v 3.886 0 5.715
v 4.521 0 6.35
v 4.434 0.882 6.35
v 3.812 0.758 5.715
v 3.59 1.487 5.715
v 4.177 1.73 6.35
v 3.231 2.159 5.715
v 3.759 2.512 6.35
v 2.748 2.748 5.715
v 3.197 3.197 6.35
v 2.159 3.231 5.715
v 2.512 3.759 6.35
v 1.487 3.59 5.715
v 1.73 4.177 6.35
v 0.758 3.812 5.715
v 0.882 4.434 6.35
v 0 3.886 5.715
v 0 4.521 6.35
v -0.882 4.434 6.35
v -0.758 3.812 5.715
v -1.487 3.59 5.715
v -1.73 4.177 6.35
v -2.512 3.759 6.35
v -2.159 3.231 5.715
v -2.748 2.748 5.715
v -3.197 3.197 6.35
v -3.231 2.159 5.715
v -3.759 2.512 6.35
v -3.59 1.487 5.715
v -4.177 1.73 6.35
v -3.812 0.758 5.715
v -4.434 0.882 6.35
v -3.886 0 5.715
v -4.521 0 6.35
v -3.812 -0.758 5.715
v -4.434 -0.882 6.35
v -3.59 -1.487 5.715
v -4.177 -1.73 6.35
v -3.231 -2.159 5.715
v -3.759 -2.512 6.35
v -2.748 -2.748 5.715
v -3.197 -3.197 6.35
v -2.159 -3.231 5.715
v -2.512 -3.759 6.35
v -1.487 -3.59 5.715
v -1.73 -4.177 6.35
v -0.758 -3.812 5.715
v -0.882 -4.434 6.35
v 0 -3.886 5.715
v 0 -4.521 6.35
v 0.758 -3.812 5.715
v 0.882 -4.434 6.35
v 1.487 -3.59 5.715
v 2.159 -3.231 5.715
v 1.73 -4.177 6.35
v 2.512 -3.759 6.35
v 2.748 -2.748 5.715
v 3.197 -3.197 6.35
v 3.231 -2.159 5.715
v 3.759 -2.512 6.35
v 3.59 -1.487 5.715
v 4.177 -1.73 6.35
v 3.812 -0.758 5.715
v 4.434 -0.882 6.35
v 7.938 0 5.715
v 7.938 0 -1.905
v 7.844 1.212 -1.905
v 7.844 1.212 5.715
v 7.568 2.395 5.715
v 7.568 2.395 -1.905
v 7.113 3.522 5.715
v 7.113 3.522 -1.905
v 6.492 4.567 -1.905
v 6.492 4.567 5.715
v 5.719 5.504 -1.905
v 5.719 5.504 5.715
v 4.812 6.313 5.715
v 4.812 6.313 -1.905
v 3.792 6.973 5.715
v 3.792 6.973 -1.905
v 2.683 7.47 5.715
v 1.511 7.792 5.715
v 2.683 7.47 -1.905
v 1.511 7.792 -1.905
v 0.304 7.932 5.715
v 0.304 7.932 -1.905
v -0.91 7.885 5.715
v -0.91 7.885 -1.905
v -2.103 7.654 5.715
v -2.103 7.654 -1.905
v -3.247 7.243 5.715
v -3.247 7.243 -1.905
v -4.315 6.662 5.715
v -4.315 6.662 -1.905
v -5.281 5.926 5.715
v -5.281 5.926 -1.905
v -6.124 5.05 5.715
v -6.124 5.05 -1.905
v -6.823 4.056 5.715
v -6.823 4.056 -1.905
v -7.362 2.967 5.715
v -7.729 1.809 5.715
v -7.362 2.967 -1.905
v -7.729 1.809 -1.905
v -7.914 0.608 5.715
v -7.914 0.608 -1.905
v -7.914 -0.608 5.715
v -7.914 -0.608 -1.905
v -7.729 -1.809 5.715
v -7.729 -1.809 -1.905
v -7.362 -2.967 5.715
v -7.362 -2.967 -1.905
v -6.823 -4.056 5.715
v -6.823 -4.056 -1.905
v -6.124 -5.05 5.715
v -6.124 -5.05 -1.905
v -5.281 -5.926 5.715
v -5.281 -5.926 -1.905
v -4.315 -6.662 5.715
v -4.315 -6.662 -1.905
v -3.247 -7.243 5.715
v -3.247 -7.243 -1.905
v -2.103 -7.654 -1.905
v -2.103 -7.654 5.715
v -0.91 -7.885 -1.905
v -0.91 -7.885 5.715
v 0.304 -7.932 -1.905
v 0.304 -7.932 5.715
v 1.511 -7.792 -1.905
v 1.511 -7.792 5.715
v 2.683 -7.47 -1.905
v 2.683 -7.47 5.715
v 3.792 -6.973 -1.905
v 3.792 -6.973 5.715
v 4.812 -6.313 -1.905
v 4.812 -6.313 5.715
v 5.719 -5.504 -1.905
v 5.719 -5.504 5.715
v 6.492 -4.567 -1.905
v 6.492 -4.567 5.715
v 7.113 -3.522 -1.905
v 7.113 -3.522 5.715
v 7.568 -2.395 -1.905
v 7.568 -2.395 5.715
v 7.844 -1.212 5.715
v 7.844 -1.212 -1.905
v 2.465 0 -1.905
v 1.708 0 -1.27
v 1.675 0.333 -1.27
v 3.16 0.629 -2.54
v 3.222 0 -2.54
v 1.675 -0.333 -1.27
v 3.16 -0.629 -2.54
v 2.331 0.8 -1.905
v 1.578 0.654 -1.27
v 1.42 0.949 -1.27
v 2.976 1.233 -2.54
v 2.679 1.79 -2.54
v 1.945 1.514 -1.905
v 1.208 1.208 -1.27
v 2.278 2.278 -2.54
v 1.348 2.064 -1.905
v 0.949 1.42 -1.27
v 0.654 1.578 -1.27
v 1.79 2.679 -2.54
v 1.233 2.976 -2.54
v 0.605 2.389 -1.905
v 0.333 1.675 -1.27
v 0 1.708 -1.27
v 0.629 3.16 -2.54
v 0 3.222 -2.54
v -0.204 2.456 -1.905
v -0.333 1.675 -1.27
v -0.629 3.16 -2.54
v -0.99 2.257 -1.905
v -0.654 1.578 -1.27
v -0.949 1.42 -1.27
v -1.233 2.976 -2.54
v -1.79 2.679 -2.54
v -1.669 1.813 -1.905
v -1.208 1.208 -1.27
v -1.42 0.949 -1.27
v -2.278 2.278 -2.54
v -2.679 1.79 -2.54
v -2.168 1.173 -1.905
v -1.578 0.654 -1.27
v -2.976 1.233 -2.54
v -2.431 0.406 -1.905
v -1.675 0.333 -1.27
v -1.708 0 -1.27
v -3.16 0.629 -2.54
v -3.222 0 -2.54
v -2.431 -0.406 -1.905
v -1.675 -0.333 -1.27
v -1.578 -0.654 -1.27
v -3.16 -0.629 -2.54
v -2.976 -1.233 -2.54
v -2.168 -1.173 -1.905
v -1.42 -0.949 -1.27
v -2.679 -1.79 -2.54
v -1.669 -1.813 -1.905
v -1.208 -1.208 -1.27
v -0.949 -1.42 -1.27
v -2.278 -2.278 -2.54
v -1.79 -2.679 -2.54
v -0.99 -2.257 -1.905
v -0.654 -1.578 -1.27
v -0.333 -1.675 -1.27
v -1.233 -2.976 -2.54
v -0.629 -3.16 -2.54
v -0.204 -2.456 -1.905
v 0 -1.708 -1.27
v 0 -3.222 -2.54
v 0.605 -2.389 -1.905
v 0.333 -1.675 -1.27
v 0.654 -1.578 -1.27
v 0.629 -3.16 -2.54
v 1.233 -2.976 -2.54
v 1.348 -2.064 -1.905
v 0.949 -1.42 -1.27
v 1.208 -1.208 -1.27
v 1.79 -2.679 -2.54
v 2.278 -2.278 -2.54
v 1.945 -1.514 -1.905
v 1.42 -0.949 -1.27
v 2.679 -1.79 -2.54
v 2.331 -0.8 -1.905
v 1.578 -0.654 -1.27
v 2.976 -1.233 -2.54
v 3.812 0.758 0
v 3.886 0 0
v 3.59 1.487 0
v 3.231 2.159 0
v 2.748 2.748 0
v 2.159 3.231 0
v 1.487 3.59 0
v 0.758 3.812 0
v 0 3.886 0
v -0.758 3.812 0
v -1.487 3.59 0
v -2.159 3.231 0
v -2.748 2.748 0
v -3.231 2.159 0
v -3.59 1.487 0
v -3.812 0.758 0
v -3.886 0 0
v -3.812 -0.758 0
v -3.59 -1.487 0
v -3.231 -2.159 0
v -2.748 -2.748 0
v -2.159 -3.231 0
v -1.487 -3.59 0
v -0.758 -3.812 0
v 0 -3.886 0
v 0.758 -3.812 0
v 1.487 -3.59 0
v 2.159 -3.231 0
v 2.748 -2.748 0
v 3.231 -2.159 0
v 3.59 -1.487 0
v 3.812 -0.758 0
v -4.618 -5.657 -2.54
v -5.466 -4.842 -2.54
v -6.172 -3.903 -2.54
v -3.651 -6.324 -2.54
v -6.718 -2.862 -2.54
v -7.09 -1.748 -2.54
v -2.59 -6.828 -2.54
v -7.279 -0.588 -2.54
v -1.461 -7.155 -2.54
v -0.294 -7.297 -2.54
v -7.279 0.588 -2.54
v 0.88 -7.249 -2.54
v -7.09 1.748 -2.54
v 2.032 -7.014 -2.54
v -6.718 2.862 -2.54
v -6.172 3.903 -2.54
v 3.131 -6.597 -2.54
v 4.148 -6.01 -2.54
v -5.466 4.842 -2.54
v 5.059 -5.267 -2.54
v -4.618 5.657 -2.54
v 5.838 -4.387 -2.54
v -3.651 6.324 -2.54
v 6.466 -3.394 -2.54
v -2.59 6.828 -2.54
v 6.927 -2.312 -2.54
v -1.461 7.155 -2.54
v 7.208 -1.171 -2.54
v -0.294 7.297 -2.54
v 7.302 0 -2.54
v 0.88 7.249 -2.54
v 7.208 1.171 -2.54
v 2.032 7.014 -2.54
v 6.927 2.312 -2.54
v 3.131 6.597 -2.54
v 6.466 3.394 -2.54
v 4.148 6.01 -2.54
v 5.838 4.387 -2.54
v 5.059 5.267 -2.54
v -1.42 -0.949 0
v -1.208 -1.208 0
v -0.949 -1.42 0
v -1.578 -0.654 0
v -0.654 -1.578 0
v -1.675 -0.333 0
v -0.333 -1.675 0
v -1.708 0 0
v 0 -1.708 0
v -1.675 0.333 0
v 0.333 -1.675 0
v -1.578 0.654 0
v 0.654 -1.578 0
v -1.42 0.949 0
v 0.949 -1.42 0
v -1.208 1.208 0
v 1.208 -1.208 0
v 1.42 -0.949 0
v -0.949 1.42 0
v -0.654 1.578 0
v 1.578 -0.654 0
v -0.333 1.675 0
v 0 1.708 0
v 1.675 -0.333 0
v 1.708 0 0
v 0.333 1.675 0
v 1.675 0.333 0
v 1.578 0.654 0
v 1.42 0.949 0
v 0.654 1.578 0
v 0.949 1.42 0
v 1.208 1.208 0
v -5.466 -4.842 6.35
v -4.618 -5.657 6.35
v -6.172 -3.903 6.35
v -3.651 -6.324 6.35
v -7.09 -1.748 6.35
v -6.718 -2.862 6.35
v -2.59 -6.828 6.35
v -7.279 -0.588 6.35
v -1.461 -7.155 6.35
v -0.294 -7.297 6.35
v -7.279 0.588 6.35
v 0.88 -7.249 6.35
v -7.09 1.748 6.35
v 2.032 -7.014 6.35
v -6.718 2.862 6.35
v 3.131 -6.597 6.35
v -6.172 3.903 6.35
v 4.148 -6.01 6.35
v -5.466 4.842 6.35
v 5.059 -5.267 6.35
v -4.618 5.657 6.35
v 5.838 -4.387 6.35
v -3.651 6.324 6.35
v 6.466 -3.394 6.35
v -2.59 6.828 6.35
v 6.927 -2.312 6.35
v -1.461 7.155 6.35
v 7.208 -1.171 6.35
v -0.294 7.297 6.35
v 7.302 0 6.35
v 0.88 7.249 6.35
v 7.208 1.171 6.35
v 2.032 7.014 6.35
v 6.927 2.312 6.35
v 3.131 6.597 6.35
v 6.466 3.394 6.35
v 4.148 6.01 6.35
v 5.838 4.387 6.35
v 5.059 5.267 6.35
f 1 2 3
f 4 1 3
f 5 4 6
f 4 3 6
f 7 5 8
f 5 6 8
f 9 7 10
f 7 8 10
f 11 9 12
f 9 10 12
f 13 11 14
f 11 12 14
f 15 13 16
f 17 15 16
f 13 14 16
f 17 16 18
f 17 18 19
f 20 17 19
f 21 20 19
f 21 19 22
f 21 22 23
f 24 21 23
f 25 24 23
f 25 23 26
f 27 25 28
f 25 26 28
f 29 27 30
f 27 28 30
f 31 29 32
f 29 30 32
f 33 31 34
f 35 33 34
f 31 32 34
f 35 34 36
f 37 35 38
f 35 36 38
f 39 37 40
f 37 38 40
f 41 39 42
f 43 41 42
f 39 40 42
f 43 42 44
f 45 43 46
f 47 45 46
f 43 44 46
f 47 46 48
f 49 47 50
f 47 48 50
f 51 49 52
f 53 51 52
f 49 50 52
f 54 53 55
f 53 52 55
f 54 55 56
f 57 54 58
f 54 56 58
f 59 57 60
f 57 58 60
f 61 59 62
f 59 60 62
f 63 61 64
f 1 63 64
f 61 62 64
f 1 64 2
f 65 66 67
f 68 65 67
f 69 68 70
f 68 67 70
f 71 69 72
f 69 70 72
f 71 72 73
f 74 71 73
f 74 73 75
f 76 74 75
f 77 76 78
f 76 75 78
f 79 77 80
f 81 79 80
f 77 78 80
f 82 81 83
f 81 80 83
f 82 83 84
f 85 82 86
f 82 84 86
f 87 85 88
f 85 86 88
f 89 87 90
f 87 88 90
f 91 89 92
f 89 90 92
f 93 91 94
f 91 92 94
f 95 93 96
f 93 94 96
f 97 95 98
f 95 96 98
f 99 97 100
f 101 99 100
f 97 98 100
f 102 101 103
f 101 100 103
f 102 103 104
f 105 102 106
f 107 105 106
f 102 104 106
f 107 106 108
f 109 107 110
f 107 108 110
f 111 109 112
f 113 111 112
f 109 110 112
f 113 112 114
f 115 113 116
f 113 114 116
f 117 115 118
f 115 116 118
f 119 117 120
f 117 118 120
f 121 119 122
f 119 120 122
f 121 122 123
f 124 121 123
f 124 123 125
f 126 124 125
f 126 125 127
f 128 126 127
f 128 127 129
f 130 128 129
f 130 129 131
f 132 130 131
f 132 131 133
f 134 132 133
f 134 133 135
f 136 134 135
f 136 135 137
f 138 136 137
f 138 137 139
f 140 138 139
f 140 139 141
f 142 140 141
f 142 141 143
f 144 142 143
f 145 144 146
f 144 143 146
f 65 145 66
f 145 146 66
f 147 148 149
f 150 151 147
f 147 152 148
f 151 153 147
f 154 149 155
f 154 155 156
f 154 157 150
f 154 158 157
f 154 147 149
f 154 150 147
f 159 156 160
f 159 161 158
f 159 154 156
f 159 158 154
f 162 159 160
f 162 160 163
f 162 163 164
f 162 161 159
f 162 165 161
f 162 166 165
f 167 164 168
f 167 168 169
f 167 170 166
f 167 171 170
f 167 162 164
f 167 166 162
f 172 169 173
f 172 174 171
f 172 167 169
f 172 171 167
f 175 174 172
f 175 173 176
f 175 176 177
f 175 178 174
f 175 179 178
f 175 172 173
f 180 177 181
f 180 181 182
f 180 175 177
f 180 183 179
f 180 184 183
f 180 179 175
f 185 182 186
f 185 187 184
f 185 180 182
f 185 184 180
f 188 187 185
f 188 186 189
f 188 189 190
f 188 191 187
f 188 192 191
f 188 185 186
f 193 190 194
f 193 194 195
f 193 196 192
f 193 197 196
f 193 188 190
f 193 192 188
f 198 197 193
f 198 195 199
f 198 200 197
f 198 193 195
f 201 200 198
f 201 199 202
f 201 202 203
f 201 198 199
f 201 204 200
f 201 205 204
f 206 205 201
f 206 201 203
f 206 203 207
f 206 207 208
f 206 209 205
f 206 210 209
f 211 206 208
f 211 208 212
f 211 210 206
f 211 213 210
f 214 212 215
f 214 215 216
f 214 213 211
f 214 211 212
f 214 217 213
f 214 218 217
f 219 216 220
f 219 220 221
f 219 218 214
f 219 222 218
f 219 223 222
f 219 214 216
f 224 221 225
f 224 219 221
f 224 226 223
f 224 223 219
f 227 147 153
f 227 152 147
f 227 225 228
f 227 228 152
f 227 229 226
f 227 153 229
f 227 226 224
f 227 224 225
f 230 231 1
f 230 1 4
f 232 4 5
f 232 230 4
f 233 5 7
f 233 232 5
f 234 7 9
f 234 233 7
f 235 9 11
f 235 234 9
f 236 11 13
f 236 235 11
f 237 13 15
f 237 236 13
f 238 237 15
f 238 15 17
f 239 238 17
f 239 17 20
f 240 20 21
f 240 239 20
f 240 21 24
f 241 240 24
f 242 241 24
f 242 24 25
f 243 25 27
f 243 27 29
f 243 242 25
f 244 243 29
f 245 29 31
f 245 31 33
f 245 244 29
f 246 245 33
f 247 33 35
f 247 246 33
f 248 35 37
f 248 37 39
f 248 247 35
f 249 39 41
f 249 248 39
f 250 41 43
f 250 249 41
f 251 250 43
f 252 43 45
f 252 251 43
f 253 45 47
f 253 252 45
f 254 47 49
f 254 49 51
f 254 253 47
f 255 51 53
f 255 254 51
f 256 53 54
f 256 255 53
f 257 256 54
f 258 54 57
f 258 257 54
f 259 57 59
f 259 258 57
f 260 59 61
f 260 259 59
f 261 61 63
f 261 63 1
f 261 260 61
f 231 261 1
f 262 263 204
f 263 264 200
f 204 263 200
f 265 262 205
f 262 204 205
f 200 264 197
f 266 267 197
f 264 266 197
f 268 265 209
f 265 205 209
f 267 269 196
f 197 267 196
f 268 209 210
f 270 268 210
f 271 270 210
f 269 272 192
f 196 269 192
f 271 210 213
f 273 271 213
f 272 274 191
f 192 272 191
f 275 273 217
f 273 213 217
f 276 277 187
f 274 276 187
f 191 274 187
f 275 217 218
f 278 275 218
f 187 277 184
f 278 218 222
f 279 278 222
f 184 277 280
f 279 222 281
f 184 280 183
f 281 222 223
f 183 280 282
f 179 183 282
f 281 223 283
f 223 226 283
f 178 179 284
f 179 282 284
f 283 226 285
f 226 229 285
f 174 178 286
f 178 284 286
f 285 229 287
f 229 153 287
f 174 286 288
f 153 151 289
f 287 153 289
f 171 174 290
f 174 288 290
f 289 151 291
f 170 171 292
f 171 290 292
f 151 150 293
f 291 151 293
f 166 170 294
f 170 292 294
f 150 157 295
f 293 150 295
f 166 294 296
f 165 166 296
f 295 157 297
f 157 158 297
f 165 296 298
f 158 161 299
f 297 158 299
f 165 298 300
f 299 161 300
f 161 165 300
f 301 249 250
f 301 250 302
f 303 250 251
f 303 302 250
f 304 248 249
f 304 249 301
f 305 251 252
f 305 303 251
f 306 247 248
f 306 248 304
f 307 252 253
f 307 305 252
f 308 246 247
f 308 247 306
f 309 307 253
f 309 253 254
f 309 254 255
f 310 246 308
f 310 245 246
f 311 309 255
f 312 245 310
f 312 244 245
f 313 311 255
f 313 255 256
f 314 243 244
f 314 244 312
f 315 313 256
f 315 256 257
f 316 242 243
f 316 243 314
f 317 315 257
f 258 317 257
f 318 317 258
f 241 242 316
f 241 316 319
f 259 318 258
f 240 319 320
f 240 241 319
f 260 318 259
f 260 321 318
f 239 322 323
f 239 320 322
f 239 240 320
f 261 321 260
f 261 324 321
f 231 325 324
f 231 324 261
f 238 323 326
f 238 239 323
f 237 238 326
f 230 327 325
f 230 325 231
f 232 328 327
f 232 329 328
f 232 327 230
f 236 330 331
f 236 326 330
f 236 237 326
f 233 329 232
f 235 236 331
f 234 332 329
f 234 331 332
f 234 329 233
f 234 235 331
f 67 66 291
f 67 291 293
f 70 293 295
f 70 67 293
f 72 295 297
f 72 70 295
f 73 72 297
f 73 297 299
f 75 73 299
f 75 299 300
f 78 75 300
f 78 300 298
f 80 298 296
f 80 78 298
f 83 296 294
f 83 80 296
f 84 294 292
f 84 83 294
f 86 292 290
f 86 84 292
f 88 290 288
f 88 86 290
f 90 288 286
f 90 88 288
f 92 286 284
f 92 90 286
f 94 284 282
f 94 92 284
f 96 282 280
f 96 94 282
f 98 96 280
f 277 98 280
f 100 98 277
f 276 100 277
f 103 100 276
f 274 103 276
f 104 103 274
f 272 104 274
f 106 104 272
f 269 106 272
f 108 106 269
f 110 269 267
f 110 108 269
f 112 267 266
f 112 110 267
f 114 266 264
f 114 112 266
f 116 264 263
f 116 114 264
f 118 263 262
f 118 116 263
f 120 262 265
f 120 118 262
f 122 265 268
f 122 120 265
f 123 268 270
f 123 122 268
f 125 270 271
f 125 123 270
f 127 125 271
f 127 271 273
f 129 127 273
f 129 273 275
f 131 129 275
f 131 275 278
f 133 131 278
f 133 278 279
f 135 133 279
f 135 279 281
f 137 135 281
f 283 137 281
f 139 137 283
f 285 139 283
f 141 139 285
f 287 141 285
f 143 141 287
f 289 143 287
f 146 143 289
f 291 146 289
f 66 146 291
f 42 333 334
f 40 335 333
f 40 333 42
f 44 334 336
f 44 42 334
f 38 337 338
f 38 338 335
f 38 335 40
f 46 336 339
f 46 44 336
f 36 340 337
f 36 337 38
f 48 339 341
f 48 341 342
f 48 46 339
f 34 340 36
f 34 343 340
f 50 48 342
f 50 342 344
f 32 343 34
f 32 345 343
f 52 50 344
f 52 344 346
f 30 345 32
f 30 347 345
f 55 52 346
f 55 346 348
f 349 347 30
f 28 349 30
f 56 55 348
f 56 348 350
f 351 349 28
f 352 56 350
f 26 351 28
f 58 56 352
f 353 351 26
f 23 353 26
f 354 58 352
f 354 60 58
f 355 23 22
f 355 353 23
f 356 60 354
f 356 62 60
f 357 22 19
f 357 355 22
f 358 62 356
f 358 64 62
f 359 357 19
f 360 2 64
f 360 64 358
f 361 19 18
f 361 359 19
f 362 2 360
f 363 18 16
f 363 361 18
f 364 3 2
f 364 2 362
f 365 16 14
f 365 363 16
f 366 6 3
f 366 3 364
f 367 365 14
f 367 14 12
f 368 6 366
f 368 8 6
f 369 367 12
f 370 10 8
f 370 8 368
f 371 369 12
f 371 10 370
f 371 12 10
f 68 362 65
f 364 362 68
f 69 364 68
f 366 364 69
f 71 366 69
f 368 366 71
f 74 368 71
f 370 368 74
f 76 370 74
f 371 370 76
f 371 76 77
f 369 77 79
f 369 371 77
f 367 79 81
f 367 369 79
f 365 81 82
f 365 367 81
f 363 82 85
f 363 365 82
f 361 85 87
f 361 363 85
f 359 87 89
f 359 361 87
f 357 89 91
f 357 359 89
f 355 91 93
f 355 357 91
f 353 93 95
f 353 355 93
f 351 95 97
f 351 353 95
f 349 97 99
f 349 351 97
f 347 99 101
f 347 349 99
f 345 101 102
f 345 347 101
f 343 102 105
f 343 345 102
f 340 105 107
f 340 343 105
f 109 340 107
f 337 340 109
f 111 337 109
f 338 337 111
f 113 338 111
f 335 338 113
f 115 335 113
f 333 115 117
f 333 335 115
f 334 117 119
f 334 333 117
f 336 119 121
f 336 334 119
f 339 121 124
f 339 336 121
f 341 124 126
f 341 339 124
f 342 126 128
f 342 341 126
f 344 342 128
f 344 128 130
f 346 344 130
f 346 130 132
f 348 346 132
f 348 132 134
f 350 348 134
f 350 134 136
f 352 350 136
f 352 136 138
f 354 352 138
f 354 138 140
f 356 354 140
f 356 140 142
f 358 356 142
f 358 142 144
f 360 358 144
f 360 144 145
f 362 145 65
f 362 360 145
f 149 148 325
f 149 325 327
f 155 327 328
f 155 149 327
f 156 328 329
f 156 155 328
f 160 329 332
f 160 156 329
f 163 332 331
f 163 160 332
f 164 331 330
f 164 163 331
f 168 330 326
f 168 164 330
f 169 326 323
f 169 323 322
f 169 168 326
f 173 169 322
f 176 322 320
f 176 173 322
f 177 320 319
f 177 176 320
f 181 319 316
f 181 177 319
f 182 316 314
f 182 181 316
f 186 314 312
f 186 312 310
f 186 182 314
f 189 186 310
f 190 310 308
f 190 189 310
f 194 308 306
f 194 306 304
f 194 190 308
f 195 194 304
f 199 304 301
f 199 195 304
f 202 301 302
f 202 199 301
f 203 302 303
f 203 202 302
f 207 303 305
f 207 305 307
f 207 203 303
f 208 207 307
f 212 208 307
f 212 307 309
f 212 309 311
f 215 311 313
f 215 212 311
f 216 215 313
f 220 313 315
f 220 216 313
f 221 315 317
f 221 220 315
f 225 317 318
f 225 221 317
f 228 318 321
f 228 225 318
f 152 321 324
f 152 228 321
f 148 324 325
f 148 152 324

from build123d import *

# Parameters (mm, degrees)
SKETCH2_R             = 7.9375
SKETCH2_R_2           = 3.8862
BOSS_EXTRUDE1_DEPTH   = 6.35
SKETCH2_R_3           = 1.70815
BOSS_EXTRUDE1_2_DEPTH = 6.35
BOSS_EXTRUDE3_START   = -2.54
SKETCH2_6_R           = 7.9375
SKETCH2_6_R_2         = 1.70815
BOSS_EXTRUDE3_DEPTH   = 2.54
CHAMFER2_SIZE         = 1.27
CHAMFER2_SIZE2        = 1.513527063
CHAMFER3_SIZE         = 0.635


with BuildPart() as part:
    # Sketch2 → Boss-Extrude1 (new body)
    with BuildSketch(Plane(origin=(0, 0, 0), x_dir=(0, 1, 0), z_dir=(0, 0, 1))):
        with Locations(Location((0, 0, 0), (0, 0, 270))):
            Circle(SKETCH2_R)
        with Locations(Location((0, 0, 0), (0, 0, 270))):
            Circle(SKETCH2_R_2, mode=Mode.SUBTRACT)
    extrude(amount=BOSS_EXTRUDE1_DEPTH)

    # Sketch2<6> → Boss-Extrude3 (add)
    with BuildSketch(Plane(origin=(0, 0, 0), x_dir=(0, 1, 0), z_dir=(0, 0, 1)).offset(BOSS_EXTRUDE3_START)):
        with Locations(Location((0, 0, 0), (0, 0, 270))):
            Circle(SKETCH2_6_R)
        with Locations(Location((0, 0, 0), (0, 0, 270))):
            Circle(SKETCH2_6_R_2, mode=Mode.SUBTRACT)
    extrude(amount=BOSS_EXTRUDE3_DEPTH)

    # Chamfer2
    chamfer2_edges = [part.edges().sort_by_distance(p)[0] for p in [
        (-1.70815, 0, -2.54),
    ]]
    chamfer2_side = [part.faces().sort_by_distance(p)[0] for p in [
        (-1.70815, 0, -1.27),
    ]]
    chamfer(chamfer2_edges, length=CHAMFER2_SIZE, length2=CHAMFER2_SIZE2, reference=chamfer2_side[0])

    # Chamfer3
    chamfer3_edges = [part.edges().sort_by_distance(p)[0] for p in [
        (-7.9375, 0, 6.35),
        (-7.9375, 0, -2.54),
        (-3.8862, 0, 6.35),
    ]]
    chamfer(chamfer3_edges, length=CHAMFER3_SIZE)


with BuildPart() as body_2:
    # Sketch2 → Boss-Extrude1 2 (new body)
    with BuildSketch(Plane(origin=(0, 0, 0), x_dir=(0, 1, 0), z_dir=(0, 0, 1))):
        with Locations(Location((0, 0, 0), (0, 0, 270))):
            Circle(SKETCH2_R_3)
    extrude(amount=BOSS_EXTRUDE1_2_DEPTH)


solid = part.part
